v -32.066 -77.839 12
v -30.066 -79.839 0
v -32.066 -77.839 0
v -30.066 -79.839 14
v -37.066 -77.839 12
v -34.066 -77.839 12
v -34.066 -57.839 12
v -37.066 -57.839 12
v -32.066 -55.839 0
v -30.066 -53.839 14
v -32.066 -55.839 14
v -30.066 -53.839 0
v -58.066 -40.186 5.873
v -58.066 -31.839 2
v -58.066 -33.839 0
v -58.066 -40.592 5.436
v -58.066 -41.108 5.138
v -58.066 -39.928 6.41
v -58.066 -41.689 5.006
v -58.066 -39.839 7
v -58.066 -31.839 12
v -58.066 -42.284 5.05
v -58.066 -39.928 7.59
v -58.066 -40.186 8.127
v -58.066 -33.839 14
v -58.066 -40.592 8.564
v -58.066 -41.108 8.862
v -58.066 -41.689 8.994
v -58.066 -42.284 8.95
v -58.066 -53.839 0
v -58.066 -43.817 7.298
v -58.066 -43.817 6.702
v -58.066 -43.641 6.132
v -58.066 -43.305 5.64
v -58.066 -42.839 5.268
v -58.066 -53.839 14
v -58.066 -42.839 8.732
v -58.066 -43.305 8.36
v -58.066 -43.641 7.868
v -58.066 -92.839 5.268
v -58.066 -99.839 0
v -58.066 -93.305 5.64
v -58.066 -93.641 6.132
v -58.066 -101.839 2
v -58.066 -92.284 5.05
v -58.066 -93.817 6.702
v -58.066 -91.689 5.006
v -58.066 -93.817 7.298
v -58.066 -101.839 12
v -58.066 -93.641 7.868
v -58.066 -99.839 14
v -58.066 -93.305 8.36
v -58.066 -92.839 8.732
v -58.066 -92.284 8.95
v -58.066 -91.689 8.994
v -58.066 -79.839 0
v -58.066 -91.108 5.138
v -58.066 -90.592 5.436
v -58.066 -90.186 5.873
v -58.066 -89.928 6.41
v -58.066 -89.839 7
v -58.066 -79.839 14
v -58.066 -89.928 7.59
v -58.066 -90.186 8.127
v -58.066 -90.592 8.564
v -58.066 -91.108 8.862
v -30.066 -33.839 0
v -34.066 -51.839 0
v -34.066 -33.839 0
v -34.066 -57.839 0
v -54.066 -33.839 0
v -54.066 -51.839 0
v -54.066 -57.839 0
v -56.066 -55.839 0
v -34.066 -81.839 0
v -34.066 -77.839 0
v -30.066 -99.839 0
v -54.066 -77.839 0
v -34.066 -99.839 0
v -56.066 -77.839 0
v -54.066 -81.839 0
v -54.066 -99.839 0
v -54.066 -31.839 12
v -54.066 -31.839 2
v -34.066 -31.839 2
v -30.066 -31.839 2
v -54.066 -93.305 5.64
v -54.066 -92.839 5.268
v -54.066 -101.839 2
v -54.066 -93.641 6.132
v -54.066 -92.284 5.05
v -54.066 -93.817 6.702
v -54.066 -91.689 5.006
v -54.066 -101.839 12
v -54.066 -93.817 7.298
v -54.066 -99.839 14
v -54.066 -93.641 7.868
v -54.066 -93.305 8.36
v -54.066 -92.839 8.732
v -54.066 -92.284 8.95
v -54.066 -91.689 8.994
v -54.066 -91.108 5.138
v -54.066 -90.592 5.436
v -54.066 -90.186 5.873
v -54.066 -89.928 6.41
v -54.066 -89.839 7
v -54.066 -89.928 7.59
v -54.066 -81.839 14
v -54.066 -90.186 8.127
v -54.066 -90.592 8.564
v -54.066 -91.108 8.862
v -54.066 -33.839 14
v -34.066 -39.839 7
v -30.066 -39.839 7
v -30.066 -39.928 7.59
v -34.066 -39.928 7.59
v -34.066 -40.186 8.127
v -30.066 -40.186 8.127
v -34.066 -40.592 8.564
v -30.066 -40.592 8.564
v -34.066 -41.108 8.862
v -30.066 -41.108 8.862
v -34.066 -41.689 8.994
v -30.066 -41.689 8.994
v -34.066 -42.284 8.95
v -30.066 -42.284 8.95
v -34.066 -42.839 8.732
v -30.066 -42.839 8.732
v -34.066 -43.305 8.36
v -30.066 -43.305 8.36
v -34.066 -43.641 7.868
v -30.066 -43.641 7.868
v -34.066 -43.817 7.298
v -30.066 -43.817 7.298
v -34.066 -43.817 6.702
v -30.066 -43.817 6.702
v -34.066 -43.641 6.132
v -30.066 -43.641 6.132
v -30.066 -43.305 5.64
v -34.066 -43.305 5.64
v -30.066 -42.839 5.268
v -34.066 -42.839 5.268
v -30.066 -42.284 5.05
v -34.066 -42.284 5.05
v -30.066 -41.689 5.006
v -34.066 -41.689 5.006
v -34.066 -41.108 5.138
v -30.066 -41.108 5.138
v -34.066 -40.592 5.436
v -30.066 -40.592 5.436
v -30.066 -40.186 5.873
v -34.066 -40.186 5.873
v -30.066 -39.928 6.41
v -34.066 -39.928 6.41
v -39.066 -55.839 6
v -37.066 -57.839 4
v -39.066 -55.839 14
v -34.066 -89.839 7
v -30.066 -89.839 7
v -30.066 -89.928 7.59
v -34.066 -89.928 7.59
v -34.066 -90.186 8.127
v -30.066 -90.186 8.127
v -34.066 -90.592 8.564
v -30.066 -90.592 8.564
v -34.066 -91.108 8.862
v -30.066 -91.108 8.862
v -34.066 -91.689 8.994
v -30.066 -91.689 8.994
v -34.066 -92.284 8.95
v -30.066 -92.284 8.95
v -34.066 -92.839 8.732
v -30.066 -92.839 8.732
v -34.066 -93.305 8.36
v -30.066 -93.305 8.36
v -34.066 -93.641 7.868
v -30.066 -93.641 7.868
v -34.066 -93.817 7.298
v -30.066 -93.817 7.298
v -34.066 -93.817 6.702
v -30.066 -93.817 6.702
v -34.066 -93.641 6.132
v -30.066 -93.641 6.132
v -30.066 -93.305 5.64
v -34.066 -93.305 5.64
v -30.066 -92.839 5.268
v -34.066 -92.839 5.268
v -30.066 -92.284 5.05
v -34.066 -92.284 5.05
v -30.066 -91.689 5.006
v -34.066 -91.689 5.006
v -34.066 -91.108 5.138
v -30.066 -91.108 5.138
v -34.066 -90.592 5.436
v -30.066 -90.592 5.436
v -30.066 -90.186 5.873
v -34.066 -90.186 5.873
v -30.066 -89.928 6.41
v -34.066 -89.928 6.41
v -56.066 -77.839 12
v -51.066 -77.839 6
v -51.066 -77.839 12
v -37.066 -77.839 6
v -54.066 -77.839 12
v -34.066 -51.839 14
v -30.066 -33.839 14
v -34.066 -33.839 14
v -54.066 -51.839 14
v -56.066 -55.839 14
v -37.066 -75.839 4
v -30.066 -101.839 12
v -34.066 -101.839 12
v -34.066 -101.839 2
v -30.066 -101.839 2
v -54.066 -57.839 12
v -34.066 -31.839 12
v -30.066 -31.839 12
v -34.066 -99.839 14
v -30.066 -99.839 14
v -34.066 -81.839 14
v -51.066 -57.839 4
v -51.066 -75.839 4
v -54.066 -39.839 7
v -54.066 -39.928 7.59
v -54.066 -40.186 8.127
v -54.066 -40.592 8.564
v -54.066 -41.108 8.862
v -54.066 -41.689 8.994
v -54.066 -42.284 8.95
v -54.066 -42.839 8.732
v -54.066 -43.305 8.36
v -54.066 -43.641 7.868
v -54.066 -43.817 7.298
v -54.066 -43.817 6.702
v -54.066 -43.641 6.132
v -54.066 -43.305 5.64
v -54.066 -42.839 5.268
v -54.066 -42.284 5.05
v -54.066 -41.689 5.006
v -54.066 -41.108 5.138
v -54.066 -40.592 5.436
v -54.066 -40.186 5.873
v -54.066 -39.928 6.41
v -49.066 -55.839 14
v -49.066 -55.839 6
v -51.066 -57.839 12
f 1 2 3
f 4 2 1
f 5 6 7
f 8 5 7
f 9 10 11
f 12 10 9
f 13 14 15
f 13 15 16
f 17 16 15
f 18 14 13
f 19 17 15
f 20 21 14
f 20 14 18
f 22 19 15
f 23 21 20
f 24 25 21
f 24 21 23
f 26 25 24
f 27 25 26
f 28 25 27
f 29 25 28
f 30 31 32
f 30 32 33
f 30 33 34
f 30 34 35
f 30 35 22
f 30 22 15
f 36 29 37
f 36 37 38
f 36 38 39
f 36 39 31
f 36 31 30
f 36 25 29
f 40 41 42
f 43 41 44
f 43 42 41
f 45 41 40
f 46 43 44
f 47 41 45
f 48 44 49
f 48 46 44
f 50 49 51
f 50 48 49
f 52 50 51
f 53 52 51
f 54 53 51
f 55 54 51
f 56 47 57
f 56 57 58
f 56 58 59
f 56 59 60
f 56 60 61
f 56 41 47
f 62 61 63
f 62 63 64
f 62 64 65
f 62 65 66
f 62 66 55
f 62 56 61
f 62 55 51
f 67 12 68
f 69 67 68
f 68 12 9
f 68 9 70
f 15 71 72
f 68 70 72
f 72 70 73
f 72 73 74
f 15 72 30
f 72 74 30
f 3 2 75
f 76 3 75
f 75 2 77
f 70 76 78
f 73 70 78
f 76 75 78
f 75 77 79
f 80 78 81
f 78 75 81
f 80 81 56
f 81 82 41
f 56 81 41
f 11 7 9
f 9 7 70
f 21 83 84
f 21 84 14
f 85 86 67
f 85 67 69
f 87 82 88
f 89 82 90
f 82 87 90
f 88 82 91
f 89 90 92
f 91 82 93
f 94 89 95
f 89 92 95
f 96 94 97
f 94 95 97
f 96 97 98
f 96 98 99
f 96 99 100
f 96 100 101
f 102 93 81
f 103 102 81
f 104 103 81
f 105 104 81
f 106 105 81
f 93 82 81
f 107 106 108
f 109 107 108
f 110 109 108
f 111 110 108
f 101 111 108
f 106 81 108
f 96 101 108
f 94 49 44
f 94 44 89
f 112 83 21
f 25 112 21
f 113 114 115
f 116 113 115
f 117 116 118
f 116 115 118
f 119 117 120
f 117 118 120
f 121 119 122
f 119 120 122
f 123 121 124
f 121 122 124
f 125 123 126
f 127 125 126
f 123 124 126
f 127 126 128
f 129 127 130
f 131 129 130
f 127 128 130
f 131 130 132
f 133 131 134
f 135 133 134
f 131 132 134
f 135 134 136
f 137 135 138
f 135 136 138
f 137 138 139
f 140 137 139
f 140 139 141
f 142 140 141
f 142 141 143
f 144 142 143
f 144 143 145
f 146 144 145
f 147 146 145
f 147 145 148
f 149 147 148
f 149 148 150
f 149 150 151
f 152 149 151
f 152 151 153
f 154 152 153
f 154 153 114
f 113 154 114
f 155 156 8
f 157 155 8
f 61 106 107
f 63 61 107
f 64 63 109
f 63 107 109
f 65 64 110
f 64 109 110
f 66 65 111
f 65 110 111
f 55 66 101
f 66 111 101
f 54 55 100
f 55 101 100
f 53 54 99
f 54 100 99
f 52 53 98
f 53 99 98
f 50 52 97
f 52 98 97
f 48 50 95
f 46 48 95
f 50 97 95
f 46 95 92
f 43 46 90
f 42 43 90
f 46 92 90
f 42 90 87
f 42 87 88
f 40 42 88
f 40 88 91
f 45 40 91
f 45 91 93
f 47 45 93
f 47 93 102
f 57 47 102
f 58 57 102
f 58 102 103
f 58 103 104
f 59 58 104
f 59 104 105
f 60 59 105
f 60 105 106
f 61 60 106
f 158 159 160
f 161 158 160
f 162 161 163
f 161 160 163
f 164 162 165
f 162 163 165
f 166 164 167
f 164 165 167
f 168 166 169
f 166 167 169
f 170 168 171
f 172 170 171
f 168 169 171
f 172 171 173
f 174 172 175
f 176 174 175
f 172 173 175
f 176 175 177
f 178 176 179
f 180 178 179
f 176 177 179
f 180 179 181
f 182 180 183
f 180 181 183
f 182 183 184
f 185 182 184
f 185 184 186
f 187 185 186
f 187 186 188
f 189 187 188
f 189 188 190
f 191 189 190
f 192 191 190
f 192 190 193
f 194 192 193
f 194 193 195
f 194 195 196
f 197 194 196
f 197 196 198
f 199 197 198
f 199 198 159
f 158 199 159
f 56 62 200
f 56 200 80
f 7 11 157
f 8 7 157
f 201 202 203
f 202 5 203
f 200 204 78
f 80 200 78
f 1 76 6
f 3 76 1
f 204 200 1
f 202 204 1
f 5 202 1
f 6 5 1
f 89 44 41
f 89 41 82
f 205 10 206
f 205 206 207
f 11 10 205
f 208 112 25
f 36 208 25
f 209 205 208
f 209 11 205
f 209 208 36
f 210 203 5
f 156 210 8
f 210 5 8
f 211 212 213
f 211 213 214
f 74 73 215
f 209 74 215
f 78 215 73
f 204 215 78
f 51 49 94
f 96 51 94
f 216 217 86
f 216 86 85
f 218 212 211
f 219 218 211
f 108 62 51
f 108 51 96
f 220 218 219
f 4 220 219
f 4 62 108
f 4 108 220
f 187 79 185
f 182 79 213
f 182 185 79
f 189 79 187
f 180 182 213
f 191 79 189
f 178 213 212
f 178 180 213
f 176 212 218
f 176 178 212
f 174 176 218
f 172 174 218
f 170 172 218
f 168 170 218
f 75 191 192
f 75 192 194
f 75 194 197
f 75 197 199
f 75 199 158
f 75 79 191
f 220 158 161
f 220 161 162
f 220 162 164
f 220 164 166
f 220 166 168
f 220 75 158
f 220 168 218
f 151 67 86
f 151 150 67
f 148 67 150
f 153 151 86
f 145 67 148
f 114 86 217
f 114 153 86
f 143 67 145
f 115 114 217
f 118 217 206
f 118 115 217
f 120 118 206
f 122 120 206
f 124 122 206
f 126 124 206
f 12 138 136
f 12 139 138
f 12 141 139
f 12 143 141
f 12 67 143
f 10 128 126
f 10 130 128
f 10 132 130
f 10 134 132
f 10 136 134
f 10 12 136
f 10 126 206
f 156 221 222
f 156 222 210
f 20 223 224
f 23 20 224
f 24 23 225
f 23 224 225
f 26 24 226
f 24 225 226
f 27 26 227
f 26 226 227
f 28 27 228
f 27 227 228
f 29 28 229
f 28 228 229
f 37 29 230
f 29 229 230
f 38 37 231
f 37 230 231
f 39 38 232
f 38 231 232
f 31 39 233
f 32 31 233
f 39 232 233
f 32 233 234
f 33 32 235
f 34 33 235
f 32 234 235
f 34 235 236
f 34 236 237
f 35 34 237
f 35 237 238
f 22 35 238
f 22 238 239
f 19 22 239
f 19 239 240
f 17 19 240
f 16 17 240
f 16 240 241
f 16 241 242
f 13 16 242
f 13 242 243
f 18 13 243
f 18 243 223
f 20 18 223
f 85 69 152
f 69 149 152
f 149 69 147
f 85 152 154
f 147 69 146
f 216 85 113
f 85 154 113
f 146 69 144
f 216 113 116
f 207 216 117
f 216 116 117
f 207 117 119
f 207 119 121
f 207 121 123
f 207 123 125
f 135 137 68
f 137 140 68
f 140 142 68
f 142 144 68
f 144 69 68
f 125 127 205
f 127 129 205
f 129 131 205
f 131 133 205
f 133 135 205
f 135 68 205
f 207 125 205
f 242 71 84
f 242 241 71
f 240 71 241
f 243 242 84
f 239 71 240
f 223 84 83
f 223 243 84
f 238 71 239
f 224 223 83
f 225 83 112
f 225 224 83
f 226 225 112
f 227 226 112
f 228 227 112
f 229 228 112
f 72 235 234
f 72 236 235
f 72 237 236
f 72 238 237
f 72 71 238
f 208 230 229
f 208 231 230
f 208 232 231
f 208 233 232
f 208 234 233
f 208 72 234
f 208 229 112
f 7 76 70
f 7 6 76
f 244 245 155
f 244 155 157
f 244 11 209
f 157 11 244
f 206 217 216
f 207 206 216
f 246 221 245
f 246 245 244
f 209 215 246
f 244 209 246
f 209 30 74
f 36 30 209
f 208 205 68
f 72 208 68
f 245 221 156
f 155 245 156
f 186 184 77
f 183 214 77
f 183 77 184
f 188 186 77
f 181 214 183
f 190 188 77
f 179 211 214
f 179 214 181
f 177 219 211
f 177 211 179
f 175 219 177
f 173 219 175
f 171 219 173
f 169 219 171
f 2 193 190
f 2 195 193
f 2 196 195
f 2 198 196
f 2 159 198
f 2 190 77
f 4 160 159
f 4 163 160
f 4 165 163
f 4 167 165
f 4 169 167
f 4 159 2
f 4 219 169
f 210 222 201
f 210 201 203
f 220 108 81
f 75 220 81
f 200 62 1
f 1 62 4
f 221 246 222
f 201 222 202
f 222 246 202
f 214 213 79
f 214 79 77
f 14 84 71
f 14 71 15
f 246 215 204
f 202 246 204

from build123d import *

# Parameters (mm, degrees)
F0_W            = 20
F0_H            = 22
F0_H_2          = 4
F0_H_3          = 20.4
F1_DEPTH        = 2
F2_DEPTH        = 10
F3_R            = 2.2
F4_DEPTH        = 30
F5_W            = 20
F5_H            = 12
F5_R            = 2.6
F7_DEPTH        = 4
F6_W            = 20
F6_H            = 12
F6_R            = 2.6
F8_DEPTH        = 4
F9_T1_DEPTH     = 25
F9_T3_DEPTH     = 57.4
F9_T5_DEPTH     = 16
F9_T7_DEPTH     = 48.4
F9_T9_DEPTH     = 2
F9_T11_DEPTH    = 20
F9_T13_DEPTH    = 7
F9_T15_DEPTH    = 25
F9_T17_DEPTH    = 14
F9_T19_DEPTH    = 27
F9_T21_DEPTH    = 14
F9_T23_DEPTH    = 30
F9_T25_DEPTH    = 7
F9_T27_DEPTH    = 8
F9_S31_W        = 2
F9_S31_H        = 2
F9_T32_DEPTH    = 2
F9_S37_W        = 2
F9_S37_H        = 2
F9_T38_DEPTH    = 2
F9_S43_W        = 2
F9_S43_H        = 2
F9_T44_DEPTH    = 2
F9_S49_W        = 2
F9_S49_H        = 2
F9_T50_DEPTH    = 2
F9_S55_W        = 2
F9_S55_H        = 2
F9_T56_DEPTH    = 2
F9_S61_W        = 2
F9_S61_H        = 2
F9_T62_DEPTH    = 2
F9_S67_W        = 2
F9_S67_H        = 2
F9_T68_DEPTH    = 2
F9_S73_W        = 2
F9_S73_H        = 2
F9_T74_DEPTH    = 2
F9_T81_DEPTH    = 30
F9_T85_DEPTH    = 30
F9_T92_DEPTH    = 7
F9_T96_DEPTH    = 53.4
F9_T103_DEPTH   = 30
F9_T107_DEPTH   = 30
F9_S1_T1_DEPTH  = 7
F9_S1_T3_DEPTH  = 30
F9_S1_T5_DEPTH  = 16
F9_S1_T7_DEPTH  = 8
F9_S1_S11_W     = 2
F9_S1_S11_H     = 2
F9_S1_T12_DEPTH = 2
F9_S1_S17_W     = 2
F9_S1_S17_H     = 2
F9_S1_T18_DEPTH = 2
F9_S1_S23_W     = 2
F9_S1_S23_H     = 2
F9_S1_T24_DEPTH = 2
F9_S1_S29_W     = 2
F9_S1_S29_H     = 2
F9_S1_T30_DEPTH = 2
F10_W           = 20
F10_H           = 30
F11_DEPTH       = 4
F12_W           = 20
F12_H           = 4
F13_DEPTH       = 10
F16_DEPTH       = 4
F17_DEPTH       = 4
F19_W           = 4
F19_H           = 14
F20_DEPTH       = 20
F18_W           = 4
F18_H           = 14
F21_DEPTH       = 20
F22_W           = 22
F22_H           = 8
F23_DEPTH       = 3
F24_W           = 22
F24_H           = 8
F25_DEPTH       = 3
F26_R           = 2
F27_R           = 2
F28_DEPTH       = 28.3421242009
F29_SIZE        = 1.99999


# Not quite as in the source:
# - a fillet or chamfer that OpenCascade refuses, or shapes differently, is made with other operations: its cross-section is extruded or revolved along the edge and cut away or added
# - a fillet or chamfer is up to 0.001 mm smaller than in the source, because OpenCascade refuses the exact size
# - a feature names something its author has since deleted; it is built from what else it names


with BuildPart() as f1:
    # F0 (on Top) → F1 (new body)
    with BuildSketch(Plane.XY):
        with Locations((-44.4073281825, 48.6883277684)):
            Rectangle(F0_W, F0_H)
        with Locations((-44.4073281825, 61.6883277684)):
            Rectangle(F0_W, F0_H_2)
        with Locations((-44.4073281825, 35.6883277684)):
            Rectangle(F0_W, F0_H_2)
        with Locations((-44.4073281825, 23.4883277684)):
            Rectangle(F0_W, F0_H_3)
        with Locations((-44.4073281825, 11.2883277684)):
            Rectangle(F0_W, F0_H_2)
    extrude(amount=-F1_DEPTH)

    # F0 (on Top) → F2 (join)
    with BuildSketch(Plane.XY):
        with Locations((-44.4073281825, 35.6883277684)):
            Rectangle(F0_W, F0_H_2)
        with Locations((-44.4073281825, 61.6883277684)):
            Rectangle(F0_W, F0_H_2)
        with Locations((-44.4073281825, 11.2883277684)):
            Rectangle(F0_W, F0_H_2)
    extrude(amount=F2_DEPTH)

    # F3 (on face) → F4 (cut)
    with BuildSketch(Plane.XZ.offset(-9.2883277684)):
        with Locations((-44.4073281825, 5.5)):
            Circle(F3_R)
    extrude(amount=-F4_DEPTH, mode=Mode.SUBTRACT)

    # F5 (on face) → F7 (join)
    with BuildSketch(Plane(origin=(-54.4073281825, 0, 0), x_dir=(0, -1, 0), z_dir=(-1, 0, 0))):
        with Locations((-73.6883277684, 4)):
            Rectangle(F5_W, F5_H)
        with Locations((-73.6883277684, 4)):
            Circle(F5_R, mode=Mode.SUBTRACT)
    extrude(amount=F7_DEPTH)

    # F6 (on face) → F8 (join)
    with BuildSketch(Plane.YZ.offset(-34.4073281825)):
        with Locations((73.6883277684, 4)):
            Rectangle(F6_W, F6_H)
        with Locations((73.6883277684, 4)):
            Circle(F6_R, mode=Mode.SUBTRACT)
        Polygon((63.6883277684, 10), (59.6883277684, 10), (59.6883277684, 0), (59.6883277684, -2), (63.6883277684, -2), align=None)
    extrude(amount=F8_DEPTH)

    # F9: fillet of radius 2 on 26 edges, made by hand

    # F9_s2 → F9_t1 (cut)
    with BuildSketch(Plane.YZ.offset(-59.4073281825)):
        with BuildLine():
            ThreePointArc((63.6883277684, 0), (63.1025413308, -1.4142135624), (61.6883277684, -2))
            Line((61.6883277684, -2), (63.6883277684, -2))
            Line((63.6883277684, -2), (63.6883277684, 0))
        make_face()
        with BuildLine():
            ThreePointArc((63.6883277684, 8), (63.1025413308, 9.4142135624), (61.6883277684, 10))
            Line((61.6883277684, 10), (63.6883277684, 10))
            Line((63.6883277684, 10), (63.6883277684, 8))
        make_face()
    extrude(amount=F9_T1_DEPTH, mode=Mode.SUBTRACT)

    # F9_s4 → F9_t3 (cut)
    with BuildSketch(Plane.XZ.offset(-68.6883277684)):
        with BuildLine():
            ThreePointArc((-54.4073281825, 0), (-53.8215417448, -1.4142135624), (-52.4073281825, -2))
            Line((-52.4073281825, -2), (-54.4073281825, -2))
            Line((-54.4073281825, -2), (-54.4073281825, 0))
        make_face()
    extrude(amount=F9_T3_DEPTH, mode=Mode.SUBTRACT)

    # F9_s6 → F9_t5 (cut)
    with BuildSketch(Plane.YZ.offset(-52.4073281825)):
        with BuildLine():
            ThreePointArc((9.2883277684, 0), (9.8741142061, -1.4142135624), (11.2883277684, -2))
            Line((11.2883277684, -2), (9.2883277684, -2))
            Line((9.2883277684, -2), (9.2883277684, 0))
        make_face()
        with BuildLine():
            ThreePointArc((9.2883277684, 8), (9.8741142061, 9.4142135624), (11.2883277684, 10))
            Line((11.2883277684, 10), (9.2883277684, 10))
            Line((9.2883277684, 10), (9.2883277684, 8))
        make_face()
    extrude(amount=F9_T5_DEPTH, mode=Mode.SUBTRACT)

    # F9_s8 → F9_t7 (cut)
    with BuildSketch(Plane.XZ.offset(-59.6883277684)):
        with BuildLine():
            ThreePointArc((-34.4073281825, 0), (-34.9931146201, -1.4142135624), (-36.4073281825, -2))
            Line((-36.4073281825, -2), (-34.4073281825, -2))
            Line((-34.4073281825, -2), (-34.4073281825, 0))
        make_face()
    extrude(amount=F9_T7_DEPTH, mode=Mode.SUBTRACT)

    # F9_s10 → F9_t9 (cut)
    with BuildSketch(Plane.YZ.offset(-34.4073281825)):
        with BuildLine():
            ThreePointArc((59.6883277684, 0), (60.2741142061, -1.4142135624), (61.6883277684, -2))
            Line((61.6883277684, -2), (59.6883277684, -2))
            Line((59.6883277684, -2), (59.6883277684, 0))
        make_face()
    extrude(amount=F9_T9_DEPTH, mode=Mode.SUBTRACT)

    # F9_s12 → F9_t11 (cut)
    with BuildSketch(Plane.XZ.offset(-81.6883277684)):
        with BuildLine():
            ThreePointArc((-30.4073281825, 0), (-30.9931146201, -1.4142135624), (-32.4073281825, -2))
            Line((-32.4073281825, -2), (-30.4073281825, -2))
            Line((-30.4073281825, -2), (-30.4073281825, 0))
        make_face()
        with BuildLine():
            ThreePointArc((-30.4073281825, 8), (-30.9931146201, 9.4142135624), (-32.4073281825, 10))
            Line((-32.4073281825, 10), (-30.4073281825, 10))
            Line((-30.4073281825, 10), (-30.4073281825, 8))
        make_face()
    extrude(amount=F9_T11_DEPTH, mode=Mode.SUBTRACT)

    # F9_s14 → F9_t13 (cut)
    with BuildSketch(Plane.YZ.offset(-39.4073281825)):
        with BuildLine():
            ThreePointArc((83.6883277684, 0), (83.1025413308, -1.4142135624), (81.6883277684, -2))
            Line((81.6883277684, -2), (83.6883277684, -2))
            Line((83.6883277684, -2), (83.6883277684, 0))
        make_face()
        with BuildLine():
            ThreePointArc((83.6883277684, 8), (83.1025413308, 9.4142135624), (81.6883277684, 10))
            Line((81.6883277684, 10), (83.6883277684, 10))
            Line((83.6883277684, 10), (83.6883277684, 8))
        make_face()
    extrude(amount=F9_T13_DEPTH, mode=Mode.SUBTRACT)

    # F9_s16 → F9_t15 (cut)
    with BuildSketch(Plane.XZ.offset(-88.6883277684)):
        with BuildLine():
            ThreePointArc((-34.4073281825, 0), (-33.8215417448, -1.4142135624), (-32.4073281825, -2))
            Line((-32.4073281825, -2), (-34.4073281825, -2))
            Line((-34.4073281825, -2), (-34.4073281825, 0))
        make_face()
        with BuildLine():
            ThreePointArc((-34.4073281825, 8), (-33.8215417448, 9.4142135624), (-32.4073281825, 10))
            Line((-32.4073281825, 10), (-34.4073281825, 10))
            Line((-34.4073281825, 10), (-34.4073281825, 8))
        make_face()
    extrude(amount=F9_T15_DEPTH, mode=Mode.SUBTRACT)

    # F9_s18 → F9_t17 (cut)
    with BuildSketch(Plane.XZ.offset(-68.6883277684)):
        with BuildLine():
            ThreePointArc((-52.4073281825, 10), (-53.8215417448, 9.4142135624), (-54.4073281825, 8))
            Line((-54.4073281825, 8), (-54.4073281825, 10))
            Line((-54.4073281825, 10), (-52.4073281825, 10))
        make_face()
    extrude(amount=F9_T17_DEPTH, mode=Mode.SUBTRACT)

    # F9_s20 → F9_t19 (cut)
    with BuildSketch(Plane.YZ.offset(-59.4073281825)):
        with BuildLine():
            ThreePointArc((59.6883277684, 8), (60.2741142061, 9.4142135624), (61.6883277684, 10))
            Line((61.6883277684, 10), (59.6883277684, 10))
            Line((59.6883277684, 10), (59.6883277684, 8))
        make_face()
    extrude(amount=F9_T19_DEPTH, mode=Mode.SUBTRACT)

    # F9_s22 → F9_t21 (cut)
    with BuildSketch(Plane.XZ.offset(-42.6883277684)):
        with BuildLine():
            ThreePointArc((-52.4073281825, 10), (-53.8215417448, 9.4142135624), (-54.4073281825, 8))
            Line((-54.4073281825, 8), (-54.4073281825, 10))
            Line((-54.4073281825, 10), (-52.4073281825, 10))
        make_face()
        with BuildLine():
            ThreePointArc((-36.4073281825, 10), (-34.9931146201, 9.4142135624), (-34.4073281825, 8))
            Line((-34.4073281825, 8), (-34.4073281825, 10))
            Line((-34.4073281825, 10), (-36.4073281825, 10))
        make_face()
    extrude(amount=F9_T21_DEPTH, mode=Mode.SUBTRACT)

    # F9_s24 → F9_t23 (cut)
    with BuildSketch(Plane.YZ.offset(-59.4073281825)):
        with BuildLine():
            ThreePointArc((33.6883277684, 8), (34.2741142061, 9.4142135624), (35.6883277684, 10))
            Line((35.6883277684, 10), (33.6883277684, 10))
            Line((33.6883277684, 10), (33.6883277684, 8))
        make_face()
        with BuildLine():
            ThreePointArc((37.6883277684, 8), (37.1025413308, 9.4142135624), (35.6883277684, 10))
            Line((35.6883277684, 10), (37.6883277684, 10))
            Line((37.6883277684, 10), (37.6883277684, 8))
        make_face()
        with BuildLine():
            ThreePointArc((13.2883277684, 8), (12.7025413308, 9.4142135624), (11.2883277684, 10))
            Line((11.2883277684, 10), (13.2883277684, 10))
            Line((13.2883277684, 10), (13.2883277684, 8))
        make_face()
    extrude(amount=F9_T23_DEPTH, mode=Mode.SUBTRACT)

    # F9_s26 → F9_t25 (cut)
    with BuildSketch(Plane.XZ.offset(-18.2883277684)):
        with BuildLine():
            ThreePointArc((-36.4073281825, 10), (-34.9931146201, 9.4142135624), (-34.4073281825, 8))
            Line((-34.4073281825, 8), (-34.4073281825, 10))
            Line((-34.4073281825, 10), (-36.4073281825, 10))
        make_face()
        with BuildLine():
            ThreePointArc((-52.4073281825, 10), (-53.8215417448, 9.4142135624), (-54.4073281825, 8))
            Line((-54.4073281825, 8), (-54.4073281825, 10))
            Line((-54.4073281825, 10), (-52.4073281825, 10))
        make_face()
    extrude(amount=F9_T25_DEPTH, mode=Mode.SUBTRACT)

    # F9_s28 → F9_t27 (cut)
    with BuildSketch(Plane.XY):
        with BuildLine():
            ThreePointArc((-36.4073281825, 9.2883277684), (-34.9931146201, 9.8741142061), (-34.4073281825, 11.2883277684))
            Line((-34.4073281825, 11.2883277684), (-34.4073281825, 9.2883277684))
            Line((-34.4073281825, 9.2883277684), (-36.4073281825, 9.2883277684))
        make_face()
        with BuildLine():
            ThreePointArc((-52.4073281825, 9.2883277684), (-53.8215417448, 9.8741142061), (-54.4073281825, 11.2883277684))
            Line((-54.4073281825, 11.2883277684), (-54.4073281825, 9.2883277684))
            Line((-54.4073281825, 9.2883277684), (-52.4073281825, 9.2883277684))
        make_face()
        with BuildLine():
            ThreePointArc((-30.4073281825, 61.6883277684), (-30.9931146201, 60.2741142061), (-32.4073281825, 59.6883277684))
            Line((-32.4073281825, 59.6883277684), (-30.4073281825, 59.6883277684))
            Line((-30.4073281825, 59.6883277684), (-30.4073281825, 61.6883277684))
        make_face()
        with BuildLine():
            ThreePointArc((-30.4073281825, 81.6883277684), (-30.9931146201, 83.1025413308), (-32.4073281825, 83.6883277684))
            Line((-32.4073281825, 83.6883277684), (-30.4073281825, 83.6883277684))
            Line((-30.4073281825, 83.6883277684), (-30.4073281825, 81.6883277684))
        make_face()
    extrude(amount=F9_T27_DEPTH, mode=Mode.SUBTRACT)


with BuildPart() as f9_tool30:
    # F9_s31 → F9_t32 (new body)
    with BuildSketch(Plane.YZ.offset(-52.4073281825)):
        with Locations((10.2883277684, -1)):
            Rectangle(F9_S31_W, F9_S31_H)
    extrude(amount=-F9_T32_DEPTH)

    # F9_s33 → F9_t34 (revolve, cut)
    with BuildSketch(Plane(origin=(-52.4073281825, 11.2883277684, 0), x_dir=(0, 0.7071067812, 0.7071067812), z_dir=(0, -0.7071067812, 0.7071067812))):
        with BuildLine():
            ThreePointArc((0, -2), (2, 0), (0, 2))
            Line((0, 2), (0, -2))
        make_face()
    revolve(axis=Axis((-52.4073281825, 11.2883277684, 0), (-1, 0, 0)), mode=Mode.SUBTRACT)


with BuildPart() as f1_1:
    add(f1.part)

    # F9_t29: cut F9_tool30
    add(f9_tool30.part, mode=Mode.SUBTRACT)


with BuildPart() as f9_tool36:
    # F9_s37 → F9_t38 (new body)
    with BuildSketch(Plane.XY):
        with Locations((-35.4073281825, 10.2883277684)):
            Rectangle(F9_S37_W, F9_S37_H)
    extrude(amount=-F9_T38_DEPTH)

    # F9_s39 → F9_t40 (revolve, cut)
    with BuildSketch(Plane(origin=(-36.4073281825, 11.2883277684, 0), x_dir=(-0.7071067812, 0.7071067812, 0), z_dir=(-0.7071067812, -0.7071067812, 0))):
        with BuildLine():
            ThreePointArc((0, -2), (2, 0), (0, 2))
            Line((0, 2), (0, -2))
        make_face()
    revolve(axis=Axis((-36.4073281825, 11.2883277684, 0), (0, 0, -1)), mode=Mode.SUBTRACT)


with BuildPart() as f1_2:
    add(f1_1.part)

    # F9_t35: cut F9_tool36
    add(f9_tool36.part, mode=Mode.SUBTRACT)


with BuildPart() as f9_tool42:
    # F9_s43 → F9_t44 (new body)
    with BuildSketch(Plane.YZ.offset(-32.4073281825)):
        with Locations((60.6883277684, -1)):
            Rectangle(F9_S43_W, F9_S43_H)
    extrude(amount=F9_T44_DEPTH)

    # F9_s45 → F9_t46 (revolve, cut)
    with BuildSketch(Plane(origin=(-32.4073281825, 61.6883277684, 0), x_dir=(0, 0.7071067812, 0.7071067812), z_dir=(0, 0.7071067812, -0.7071067812))):
        with BuildLine():
            ThreePointArc((0, -2), (2, 0), (0, 2))
            Line((0, 2), (0, -2))
        make_face()
    revolve(axis=Axis((-32.4073281825, 61.6883277684, 0), (1, 0, 0)), mode=Mode.SUBTRACT)


with BuildPart() as f1_3:
    add(f1_2.part)

    # F9_t41: cut F9_tool42
    add(f9_tool42.part, mode=Mode.SUBTRACT)


with BuildPart() as f9_tool48:
    # F9_s49 → F9_t50 (new body)
    with BuildSketch(Plane.XY):
        with Locations((-31.4073281825, 82.6883277684)):
            Rectangle(F9_S49_W, F9_S49_H)
    extrude(amount=-F9_T50_DEPTH)

    # F9_s51 → F9_t52 (revolve, cut)
    with BuildSketch(Plane(origin=(-32.4073281825, 81.6883277684, 0), x_dir=(-0.7071067812, -0.7071067812, 0), z_dir=(0.7071067812, -0.7071067812, 0))):
        with BuildLine():
            ThreePointArc((0, -2), (2, 0), (0, 2))
            Line((0, 2), (0, -2))
        make_face()
    revolve(axis=Axis((-32.4073281825, 81.6883277684, 0), (0, 0, -1)), mode=Mode.SUBTRACT)


with BuildPart() as f1_4:
    add(f1_3.part)

    # F9_t47: cut F9_tool48
    add(f9_tool48.part, mode=Mode.SUBTRACT)


with BuildPart() as f9_tool54:
    # F9_s55 → F9_t56 (new body)
    with BuildSketch(Plane.XY.offset(8)):
        with Locations((-31.4073281825, 60.6883277684)):
            Rectangle(F9_S55_W, F9_S55_H)
    extrude(amount=F9_T56_DEPTH)

    # F9_s57 → F9_t58 (revolve, cut)
    with BuildSketch(Plane(origin=(-32.4073281825, 61.6883277684, 8), x_dir=(-0.7071067812, 0.7071067812, 0), z_dir=(0.7071067812, 0.7071067812, 0))):
        with BuildLine():
            ThreePointArc((0, -2), (2, 0), (0, 2))
            Line((0, 2), (0, -2))
        make_face()
    revolve(axis=Axis((-32.4073281825, 61.6883277684, 8), (0, 0, 1)), mode=Mode.SUBTRACT)


with BuildPart() as f1_5:
    add(f1_4.part)

    # F9_t53: cut F9_tool54
    add(f9_tool54.part, mode=Mode.SUBTRACT)


with BuildPart() as f9_tool60:
    # F9_s61 → F9_t62 (new body)
    with BuildSketch(Plane.XZ.offset(-81.6883277684)):
        with Locations((-31.4073281825, 9)):
            Rectangle(F9_S61_W, F9_S61_H)
    extrude(amount=-F9_T62_DEPTH)

    # F9_s63 → F9_t64 (revolve, cut)
    with BuildSketch(Plane(origin=(-32.4073281825, 81.6883277684, 8), x_dir=(-0.7071067812, 0, -0.7071067812), z_dir=(0.7071067812, 0, -0.7071067812))):
        with BuildLine():
            ThreePointArc((0, -2), (2, 0), (0, 2))
            Line((0, 2), (0, -2))
        make_face()
    revolve(axis=Axis((-32.4073281825, 81.6883277684, 8), (0, 1, 0)), mode=Mode.SUBTRACT)


with BuildPart() as f1_6:
    add(f1_5.part)

    # F9_t59: cut F9_tool60
    add(f9_tool60.part, mode=Mode.SUBTRACT)


with BuildPart() as f9_tool66:
    # F9_s67 → F9_t68 (new body)
    with BuildSketch(Plane.XZ.offset(-11.2883277684)):
        with Locations((-35.4073281825, 9)):
            Rectangle(F9_S67_W, F9_S67_H)
    extrude(amount=F9_T68_DEPTH)

    # F9_s69 → F9_t70 (revolve, cut)
    with BuildSketch(Plane(origin=(-36.4073281825, 11.2883277684, 8), x_dir=(-0.7071067812, 0, -0.7071067812), z_dir=(-0.7071067812, 0, 0.7071067812))):
        with BuildLine():
            ThreePointArc((0, -2), (2, 0), (0, 2))
            Line((0, 2), (0, -2))
        make_face()
    revolve(axis=Axis((-36.4073281825, 11.2883277684, 8), (0, -1, 0)), mode=Mode.SUBTRACT)


with BuildPart() as f1_7:
    add(f1_6.part)

    # F9_t65: cut F9_tool66
    add(f9_tool66.part, mode=Mode.SUBTRACT)


with BuildPart() as f9_tool72:
    # F9_s73 → F9_t74 (new body)
    with BuildSketch(Plane.YZ.offset(-52.4073281825)):
        with Locations((10.2883277684, 9)):
            Rectangle(F9_S73_W, F9_S73_H)
    extrude(amount=-F9_T74_DEPTH)

    # F9_s75 → F9_t76 (revolve, cut)
    with BuildSketch(Plane(origin=(-52.4073281825, 11.2883277684, 8), x_dir=(0, 0.7071067812, -0.7071067812), z_dir=(0, 0.7071067812, 0.7071067812))):
        with BuildLine():
            ThreePointArc((0, -2), (2, 0), (0, 2))
            Line((0, 2), (0, -2))
        make_face()
    revolve(axis=Axis((-52.4073281825, 11.2883277684, 8), (-1, 0, 0)), mode=Mode.SUBTRACT)


with BuildPart() as f1_8:
    add(f1_7.part)

    # F9_t71: cut F9_tool72
    add(f9_tool72.part, mode=Mode.SUBTRACT)


with BuildPart() as f9_tool79:
    # F9_s80 → F9_t81 (new body)
    with BuildSketch(Plane.YZ.offset(-29.4073281825)):
        with BuildLine():
            ThreePointArc((63.6883277684, 0), (63.1025413308, -1.4142135624), (61.6883277684, -2))
            Line((61.6883277684, -2), (63.6883277684, -2))
            Line((63.6883277684, -2), (63.6883277684, 0))
        make_face()
    extrude(amount=-F9_T81_DEPTH)

    split(bisect_by=Plane.YZ.offset(-34.4073281825), keep=Keep.TOP)


with BuildPart() as f9_tool83:
    # F9_s84 → F9_t85 (new body)
    with BuildSketch(Plane.XZ.offset(-58.6883277684)):
        with BuildLine():
            ThreePointArc((-34.4073281825, 0), (-33.8215417448, -1.4142135624), (-32.4073281825, -2))
            Line((-32.4073281825, -2), (-34.4073281825, -2))
            Line((-34.4073281825, -2), (-34.4073281825, 0))
        make_face()
    extrude(amount=-F9_T85_DEPTH)

    split(bisect_by=Plane.XZ.offset(-63.6883277684), keep=Keep.TOP)


with BuildPart() as f9_tool79_1:
    add(f9_tool79.part)

    # F9_t87: intersect F9_tool83
    add(f9_tool83.part, mode=Mode.INTERSECT)


with BuildPart() as f1_9:
    add(f1_8.part)

    # F9_t77: cut F9_tool79
    add(f9_tool79_1.part, mode=Mode.SUBTRACT)


with BuildPart() as f9_tool90:
    # F9_s91 → F9_t92 (new body)
    with BuildSketch(Plane.YZ.offset(-39.4073281825)):
        with BuildLine():
            ThreePointArc((59.6883277684, 0), (60.2741142061, -1.4142135624), (61.6883277684, -2))
            Line((61.6883277684, -2), (59.6883277684, -2))
            Line((59.6883277684, -2), (59.6883277684, 0))
        make_face()
    extrude(amount=F9_T92_DEPTH)

    split(bisect_by=Plane.YZ.offset(-34.4073281825), keep=Keep.BOTTOM)


with BuildPart() as f9_tool94:
    # F9_s95 → F9_t96 (new body)
    with BuildSketch(Plane.XZ.offset(-11.2883277684)):
        with BuildLine():
            ThreePointArc((-34.4073281825, 0), (-34.9931146201, -1.4142135624), (-36.4073281825, -2))
            Line((-36.4073281825, -2), (-34.4073281825, -2))
            Line((-34.4073281825, -2), (-34.4073281825, 0))
        make_face()
    extrude(amount=-F9_T96_DEPTH)

    split(bisect_by=Plane.XZ.offset(-59.6883277684), keep=Keep.BOTTOM)


with BuildPart() as f9_tool90_1:
    add(f9_tool90.part)

    # F9_t98: intersect F9_tool94
    add(f9_tool94.part, mode=Mode.INTERSECT)


with BuildPart() as f1_10:
    add(f1_9.part)

    # F9_t88: cut F9_tool90
    add(f9_tool90_1.part, mode=Mode.SUBTRACT)


with BuildPart() as f9_tool101:
    # F9_s102 → F9_t103 (new body)
    with BuildSketch(Plane.YZ.offset(-29.4073281825)):
        with BuildLine():
            ThreePointArc((63.6883277684, 8), (63.1025413308, 9.4142135624), (61.6883277684, 10))
            Line((61.6883277684, 10), (63.6883277684, 10))
            Line((63.6883277684, 10), (63.6883277684, 8))
        make_face()
    extrude(amount=-F9_T103_DEPTH)

    split(bisect_by=Plane.YZ.offset(-34.4073281825), keep=Keep.TOP)


with BuildPart() as f9_tool105:
    # F9_s106 → F9_t107 (new body)
    with BuildSketch(Plane.XZ.offset(-88.6883277684)):
        with BuildLine():
            ThreePointArc((-34.4073281825, 8), (-33.8215417448, 9.4142135624), (-32.4073281825, 10))
            Line((-32.4073281825, 10), (-34.4073281825, 10))
            Line((-34.4073281825, 10), (-34.4073281825, 8))
        make_face()
    extrude(amount=F9_T107_DEPTH)

    split(bisect_by=Plane.XZ.offset(-63.6883277684), keep=Keep.TOP)


with BuildPart() as f9_tool101_1:
    add(f9_tool101.part)

    # F9_t109: intersect F9_tool105
    add(f9_tool105.part, mode=Mode.INTERSECT)


with BuildPart() as f1_11:
    add(f1_10.part)

    # F9_t99: cut F9_tool101
    add(f9_tool101_1.part, mode=Mode.SUBTRACT)

    # F9#s1: fillet of radius 2 on 10 edges, made by hand

    # F9_s1_s2 → F9_s1_t1 (cut)
    with BuildSketch(Plane.YZ.offset(-56.4073281825)):
        with BuildLine():
            ThreePointArc((83.6883277684, 0), (83.1025413308, -1.4142135624), (81.6883277684, -2))
            Line((81.6883277684, -2), (83.6883277684, -2))
            Line((83.6883277684, -2), (83.6883277684, 0))
        make_face()
        with BuildLine():
            ThreePointArc((63.6883277684, 0), (64.2741142061, -1.4142135624), (65.6883277684, -2))
            Line((65.6883277684, -2), (63.6883277684, -2))
            Line((63.6883277684, -2), (63.6883277684, 0))
        make_face()
        with BuildLine():
            ThreePointArc((63.6883277684, 8), (64.2741142061, 9.4142135624), (65.6883277684, 10))
            Line((65.6883277684, 10), (63.6883277684, 10))
            Line((63.6883277684, 10), (63.6883277684, 8))
        make_face()
        with BuildLine():
            ThreePointArc((81.6883277684, 10), (83.1025413308, 9.4142135624), (83.6883277684, 8))
            Line((83.6883277684, 8), (83.6883277684, 10))
            Line((83.6883277684, 10), (81.6883277684, 10))
        make_face()
    extrude(amount=F9_S1_T1_DEPTH, mode=Mode.SUBTRACT)

    # F9_s1_s4 → F9_s1_t3 (cut)
    with BuildSketch(Plane.XZ.offset(-88.6883277684)):
        with BuildLine():
            ThreePointArc((-56.4073281825, -2), (-54.9931146201, -1.4142135624), (-54.4073281825, 0))
            Line((-54.4073281825, 0), (-54.4073281825, -2))
            Line((-54.4073281825, -2), (-56.4073281825, -2))
        make_face()
        with BuildLine():
            ThreePointArc((-56.4073281825, 10), (-54.9931146201, 9.4142135624), (-54.4073281825, 8))
            Line((-54.4073281825, 8), (-54.4073281825, 10))
            Line((-54.4073281825, 10), (-56.4073281825, 10))
        make_face()
    extrude(amount=F9_S1_T3_DEPTH, mode=Mode.SUBTRACT)

    # F9_s1_s6 → F9_s1_t5 (cut)
    with BuildSketch(Plane.XZ.offset(-81.6883277684)):
        with BuildLine():
            ThreePointArc((-58.4073281825, 0), (-57.8215417448, -1.4142135624), (-56.4073281825, -2))
            Line((-56.4073281825, -2), (-58.4073281825, -2))
            Line((-58.4073281825, -2), (-58.4073281825, 0))
        make_face()
        with BuildLine():
            ThreePointArc((-56.4073281825, 10), (-57.8215417448, 9.4142135624), (-58.4073281825, 8))
            Line((-58.4073281825, 8), (-58.4073281825, 10))
            Line((-58.4073281825, 10), (-56.4073281825, 10))
        make_face()
    extrude(amount=F9_S1_T5_DEPTH, mode=Mode.SUBTRACT)

    # F9_s1_s8 → F9_s1_t7 (cut)
    with BuildSketch(Plane.XY):
        with BuildLine():
            ThreePointArc((-56.4073281825, 63.6883277684), (-57.8215417448, 64.2741142061), (-58.4073281825, 65.6883277684))
            Line((-58.4073281825, 65.6883277684), (-58.4073281825, 63.6883277684))
            Line((-58.4073281825, 63.6883277684), (-56.4073281825, 63.6883277684))
        make_face()
        with BuildLine():
            ThreePointArc((-56.4073281825, 83.6883277684), (-57.8215417448, 83.1025413308), (-58.4073281825, 81.6883277684))
            Line((-58.4073281825, 81.6883277684), (-58.4073281825, 83.6883277684))
            Line((-58.4073281825, 83.6883277684), (-56.4073281825, 83.6883277684))
        make_face()
    extrude(amount=F9_S1_T7_DEPTH, mode=Mode.SUBTRACT)


with BuildPart() as f9_s1_tool10:
    # F9_s1_s11 → F9_s1_t12 (new body)
    with BuildSketch(Plane.XZ.offset(-81.6883277684)):
        with Locations((-57.4073281825, -1)):
            Rectangle(F9_S1_S11_W, F9_S1_S11_H)
    extrude(amount=-F9_S1_T12_DEPTH)

    # F9_s1_s13 → F9_s1_t14 (revolve, cut)
    with BuildSketch(Plane(origin=(-56.4073281825, 81.6883277684, 0), x_dir=(0.7071067812, 0, 0.7071067812), z_dir=(-0.7071067812, 0, 0.7071067812))):
        with BuildLine():
            ThreePointArc((0, -2), (2, 0), (0, 2))
            Line((0, 2), (0, -2))
        make_face()
    revolve(axis=Axis((-56.4073281825, 81.6883277684, 0), (0, 1, 0)), mode=Mode.SUBTRACT)


with BuildPart() as f1_12:
    add(f1_11.part)

    # F9_s1_t9: cut F9_s1_tool10
    add(f9_s1_tool10.part, mode=Mode.SUBTRACT)


with BuildPart() as f9_s1_tool16:
    # F9_s1_s17 → F9_s1_t18 (new body)
    with BuildSketch(Plane.XZ.offset(-65.6883277684)):
        with Locations((-57.4073281825, -1)):
            Rectangle(F9_S1_S17_W, F9_S1_S17_H)
    extrude(amount=F9_S1_T18_DEPTH)

    # F9_s1_s19 → F9_s1_t20 (revolve, cut)
    with BuildSketch(Plane(origin=(-56.4073281825, 65.6883277684, 0), x_dir=(0.7071067812, 0, 0.7071067812), z_dir=(0.7071067812, 0, -0.7071067812))):
        with BuildLine():
            ThreePointArc((0, -2), (2, 0), (0, 2))
            Line((0, 2), (0, -2))
        make_face()
    revolve(axis=Axis((-56.4073281825, 65.6883277684, 0), (0, -1, 0)), mode=Mode.SUBTRACT)


with BuildPart() as f1_13:
    add(f1_12.part)

    # F9_s1_t15: cut F9_s1_tool16
    add(f9_s1_tool16.part, mode=Mode.SUBTRACT)


with BuildPart() as f9_s1_tool22:
    # F9_s1_s23 → F9_s1_t24 (new body)
    with BuildSketch(Plane.XZ.offset(-65.6883277684)):
        with Locations((-57.4073281825, 9)):
            Rectangle(F9_S1_S23_W, F9_S1_S23_H)
    extrude(amount=F9_S1_T24_DEPTH)

    # F9_s1_s25 → F9_s1_t26 (revolve, cut)
    with BuildSketch(Plane(origin=(-56.4073281825, 65.6883277684, 8), x_dir=(0.7071067812, 0, -0.7071067812), z_dir=(-0.7071067812, 0, -0.7071067812))):
        with BuildLine():
            ThreePointArc((0, -2), (2, 0), (0, 2))
            Line((0, 2), (0, -2))
        make_face()
    revolve(axis=Axis((-56.4073281825, 65.6883277684, 8), (0, -1, 0)), mode=Mode.SUBTRACT)


with BuildPart() as f1_14:
    add(f1_13.part)

    # F9_s1_t21: cut F9_s1_tool22
    add(f9_s1_tool22.part, mode=Mode.SUBTRACT)


with BuildPart() as f9_s1_tool28:
    # F9_s1_s29 → F9_s1_t30 (new body)
    with BuildSketch(Plane.XY.offset(8)):
        with Locations((-57.4073281825, 82.6883277684)):
            Rectangle(F9_S1_S29_W, F9_S1_S29_H)
    extrude(amount=F9_S1_T30_DEPTH)

    # F9_s1_s31 → F9_s1_t32 (revolve, cut)
    with BuildSketch(Plane(origin=(-56.4073281825, 81.6883277684, 8), x_dir=(0.7071067812, -0.7071067812, 0), z_dir=(-0.7071067812, -0.7071067812, 0))):
        with BuildLine():
            ThreePointArc((0, -2), (2, 0), (0, 2))
            Line((0, 2), (0, -2))
        make_face()
    revolve(axis=Axis((-56.4073281825, 81.6883277684, 8), (0, 0, 1)), mode=Mode.SUBTRACT)


with BuildPart() as f1_15:
    add(f1_14.part)

    # F9_s1_t27: cut F9_s1_tool28
    add(f9_s1_tool28.part, mode=Mode.SUBTRACT)


with BuildPart() as f11:
    # F10 (on Top) → F11 (new body)
    with BuildSketch(Plane.XY):
        with Locations((-44.0662039816, -66.8389573097)):
            Rectangle(F10_W, F10_H)
    extrude(amount=F11_DEPTH)

    # F12 (on face) → F13 (join)
    with BuildSketch(Plane.XY.offset(4)):
        with Locations((-44.0662039816, -53.8389573097)):
            Rectangle(F12_W, F12_H)
        with Locations((-44.0662039816, -79.8389573097)):
            Rectangle(F12_W, F12_H)
    extrude(amount=F13_DEPTH)

    # F15 (on face) → F16 (join)
    with BuildSketch(Plane.YZ.offset(-34.0662039816)):
        Polygon((-77.8389573097, 0), (-77.8389573097, 4), (-77.8389573097, 14), (-81.8389573097, 14), (-81.8389573097, 0), align=None)
        Polygon((-55.8389573097, 14), (-55.8389573097, 4), (-55.8389573097, 0), (-51.8389573097, 0), (-51.8389573097, 14), align=None)
    extrude(amount=F16_DEPTH)

    # F14 (on face) → F17 (join)
    with BuildSketch(Plane(origin=(-54.0662039816, 0, 0), x_dir=(0, -1, 0), z_dir=(-1, 0, 0))):
        Polygon((55.8389573097, 0), (55.8389573097, 4), (55.8389573097, 14), (51.8389573097, 14), (51.8389573097, 0), align=None)
        Polygon((77.8389573097, 14), (77.8389573097, 4), (77.8389573097, 0), (81.8389573097, 0), (81.8389573097, 14), align=None)
    extrude(amount=F17_DEPTH)

    # F19 (on face) → F20 (join)
    with BuildSketch(Plane.XZ.offset(81.8389573097)):
        with Locations((-56.0662039816, 7)):
            Rectangle(F19_W, F19_H)
        with Locations((-32.0662039816, 7)):
            Rectangle(F19_W, F19_H)
    extrude(amount=F20_DEPTH)

    # F18 (on face) → F21 (join)
    with BuildSketch(Plane(origin=(0, -51.8389573097, 0), x_dir=(-1, 0, 0), z_dir=(0, 1, 0))):
        with Locations((32.0662039816, 7)):
            Rectangle(F18_W, F18_H)
        with Locations((56.0662039816, 7)):
            Rectangle(F18_W, F18_H)
    extrude(amount=F21_DEPTH)

    # F22 (on face) → F23 (join)
    with BuildSketch(Plane(origin=(-54.0662039816, 0, 0), x_dir=(0, -1, 0), z_dir=(-1, 0, 0))):
        with Locations((66.8389573097, 8)):
            Rectangle(F22_W, F22_H)
    extrude(amount=-F23_DEPTH)

    # F24 (on face) → F25 (join)
    with BuildSketch(Plane.YZ.offset(-34.0662039816)):
        with Locations((-66.8389573097, 8)):
            Rectangle(F24_W, F24_H)
    extrude(amount=-F25_DEPTH)

    # F26 (on face) + F27 (on face) → F28 (cut, through all)
    with BuildSketch(Plane.YZ.offset(-30.0662039816)):
        with Locations((-91.8389573097, 7)):
            Circle(F26_R)
    with BuildSketch(Plane.YZ.offset(-30.0662039816)):
        with Locations((-41.8389573097, 7)):
            Circle(F27_R)
    extrude(amount=-F28_DEPTH, mode=Mode.SUBTRACT)

    # F29 (size 2 in the source; OpenCascade refuses exactly that, so slightly less here)
    f29_edges = [f11.edges().sort_by_distance(p)[0] for p in [
        (-32.066204, -101.838957, 0),
        (-30.066204, -77.838957, 7),
        (-44.066204, -77.838957, 4),
        (-44.066204, -77.838957, 14),
        (-58.066204, -77.838957, 7),
        (-44.066204, -55.838957, 4),
        (-51.066204, -55.838957, 8),
        (-37.066204, -55.838957, 8),
        (-34.066204, -55.838957, 6),
        (-35.566204, -55.838957, 12),
        (-52.566204, -55.838957, 12),
        (-54.066204, -55.838957, 6),
        (-30.066204, -55.838957, 7),
        (-58.066204, -55.838957, 7),
        (-32.066204, -31.838957, 14),
        (-56.066204, -31.838957, 14),
        (-56.066204, -31.838957, 0),
        (-32.066204, -31.838957, 0),
        (-56.066204, -101.838957, 14),
        (-32.066204, -101.838957, 14),
        (-56.066204, -101.838957, 0),
    ]]
    chamfer(f29_edges, length=F29_SIZE)


solid = f11.part
